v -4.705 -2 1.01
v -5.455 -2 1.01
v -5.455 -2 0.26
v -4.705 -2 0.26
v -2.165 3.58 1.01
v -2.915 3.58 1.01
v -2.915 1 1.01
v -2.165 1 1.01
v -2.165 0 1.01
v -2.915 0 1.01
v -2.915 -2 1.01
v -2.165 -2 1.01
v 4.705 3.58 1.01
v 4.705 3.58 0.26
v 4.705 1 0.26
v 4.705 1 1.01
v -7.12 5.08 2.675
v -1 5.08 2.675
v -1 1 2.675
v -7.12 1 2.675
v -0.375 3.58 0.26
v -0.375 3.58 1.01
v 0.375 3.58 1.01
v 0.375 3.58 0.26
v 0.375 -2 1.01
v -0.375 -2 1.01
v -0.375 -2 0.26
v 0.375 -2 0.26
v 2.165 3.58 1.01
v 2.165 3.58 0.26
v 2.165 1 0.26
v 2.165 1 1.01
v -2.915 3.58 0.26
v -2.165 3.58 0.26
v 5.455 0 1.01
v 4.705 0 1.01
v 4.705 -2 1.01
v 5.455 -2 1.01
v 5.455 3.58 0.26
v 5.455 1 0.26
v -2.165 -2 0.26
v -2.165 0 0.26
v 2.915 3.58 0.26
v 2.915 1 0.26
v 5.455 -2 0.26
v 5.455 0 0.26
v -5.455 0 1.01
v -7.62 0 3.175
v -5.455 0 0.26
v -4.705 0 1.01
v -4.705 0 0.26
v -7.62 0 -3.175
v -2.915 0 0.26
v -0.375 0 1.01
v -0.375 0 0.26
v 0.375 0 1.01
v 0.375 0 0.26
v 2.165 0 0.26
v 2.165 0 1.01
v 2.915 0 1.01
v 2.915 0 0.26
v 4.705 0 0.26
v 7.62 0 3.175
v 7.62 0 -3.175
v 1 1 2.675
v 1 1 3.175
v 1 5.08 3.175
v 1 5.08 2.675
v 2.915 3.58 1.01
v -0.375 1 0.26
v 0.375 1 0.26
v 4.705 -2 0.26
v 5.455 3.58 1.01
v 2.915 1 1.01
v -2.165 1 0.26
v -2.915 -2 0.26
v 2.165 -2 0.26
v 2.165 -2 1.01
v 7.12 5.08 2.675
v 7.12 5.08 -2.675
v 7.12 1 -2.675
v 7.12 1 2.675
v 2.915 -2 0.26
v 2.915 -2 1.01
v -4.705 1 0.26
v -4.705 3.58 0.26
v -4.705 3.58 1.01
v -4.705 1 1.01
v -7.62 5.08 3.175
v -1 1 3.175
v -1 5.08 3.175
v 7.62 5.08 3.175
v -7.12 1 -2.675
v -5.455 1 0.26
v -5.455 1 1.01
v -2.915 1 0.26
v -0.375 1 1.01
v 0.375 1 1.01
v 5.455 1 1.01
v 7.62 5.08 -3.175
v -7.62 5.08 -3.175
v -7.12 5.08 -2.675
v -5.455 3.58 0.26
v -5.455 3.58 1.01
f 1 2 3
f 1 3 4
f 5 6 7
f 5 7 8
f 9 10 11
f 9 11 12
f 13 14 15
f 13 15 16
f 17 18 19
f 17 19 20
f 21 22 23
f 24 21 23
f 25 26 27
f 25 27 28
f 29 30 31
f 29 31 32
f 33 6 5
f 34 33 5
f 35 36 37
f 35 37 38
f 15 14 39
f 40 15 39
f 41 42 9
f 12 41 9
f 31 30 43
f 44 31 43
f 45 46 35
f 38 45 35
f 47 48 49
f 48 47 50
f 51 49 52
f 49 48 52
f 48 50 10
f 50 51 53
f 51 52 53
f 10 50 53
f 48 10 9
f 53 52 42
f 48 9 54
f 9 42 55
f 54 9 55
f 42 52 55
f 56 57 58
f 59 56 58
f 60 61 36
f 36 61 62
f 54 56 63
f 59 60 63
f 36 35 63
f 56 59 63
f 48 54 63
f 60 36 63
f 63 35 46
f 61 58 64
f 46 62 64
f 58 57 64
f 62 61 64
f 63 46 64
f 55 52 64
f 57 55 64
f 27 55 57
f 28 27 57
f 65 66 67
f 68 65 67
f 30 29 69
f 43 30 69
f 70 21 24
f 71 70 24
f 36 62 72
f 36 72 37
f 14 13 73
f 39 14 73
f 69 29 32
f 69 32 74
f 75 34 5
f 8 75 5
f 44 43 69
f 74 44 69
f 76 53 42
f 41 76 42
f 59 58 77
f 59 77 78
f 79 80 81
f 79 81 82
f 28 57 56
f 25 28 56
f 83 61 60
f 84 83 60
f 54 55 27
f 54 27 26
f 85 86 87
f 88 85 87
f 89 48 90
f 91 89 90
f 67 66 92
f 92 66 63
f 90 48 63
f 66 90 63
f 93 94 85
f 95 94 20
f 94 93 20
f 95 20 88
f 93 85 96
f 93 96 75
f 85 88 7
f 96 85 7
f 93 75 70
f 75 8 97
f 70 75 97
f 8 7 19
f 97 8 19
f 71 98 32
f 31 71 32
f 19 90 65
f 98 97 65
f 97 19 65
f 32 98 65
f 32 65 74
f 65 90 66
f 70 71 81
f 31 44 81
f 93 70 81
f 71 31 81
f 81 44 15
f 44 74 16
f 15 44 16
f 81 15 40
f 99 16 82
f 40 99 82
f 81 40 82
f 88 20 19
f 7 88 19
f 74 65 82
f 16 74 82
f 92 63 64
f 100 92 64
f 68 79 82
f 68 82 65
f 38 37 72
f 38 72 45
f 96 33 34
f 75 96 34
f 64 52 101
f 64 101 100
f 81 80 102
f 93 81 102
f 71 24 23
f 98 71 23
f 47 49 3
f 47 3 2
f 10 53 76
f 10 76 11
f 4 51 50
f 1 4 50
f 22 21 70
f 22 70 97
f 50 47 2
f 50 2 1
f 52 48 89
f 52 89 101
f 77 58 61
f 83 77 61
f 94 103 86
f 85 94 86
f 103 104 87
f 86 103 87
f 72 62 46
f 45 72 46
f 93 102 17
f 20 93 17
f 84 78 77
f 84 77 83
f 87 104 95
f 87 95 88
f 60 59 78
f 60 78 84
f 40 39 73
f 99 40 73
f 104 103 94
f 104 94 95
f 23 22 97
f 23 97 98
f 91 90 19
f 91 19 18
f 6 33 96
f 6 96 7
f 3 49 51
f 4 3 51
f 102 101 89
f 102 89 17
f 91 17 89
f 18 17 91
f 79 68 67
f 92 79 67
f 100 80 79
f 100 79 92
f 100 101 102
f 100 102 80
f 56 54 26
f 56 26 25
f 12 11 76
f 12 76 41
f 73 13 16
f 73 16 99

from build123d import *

# Parameters (mm, degrees)
SKETCH_1_W           = 15.24
SKETCH_1_H           = 6.35
EXTRUDE_1_DEPTH      = 5.08
SKETCH_2_W           = 14.24
SKETCH_2_H           = 5.35
CUT_EXTRUDE_1_DEPTH  = 4.08
SKETCH_3_W           = 2
SKETCH_3_H           = 4.08
CUT_EXTRUDE_2_DEPTH  = 1
EXTRUDE_2_DEPTH      = 2
EXTRUDE_2_DEPTH_BACK = 3.58
SKETCH_4_W           = 0.75
SKETCH_4_H           = 0.75


with BuildPart() as part:
    # 草图1 → 拉伸1 (new body)
    with BuildSketch(Plane(origin=(0, 0, 0), x_dir=(1, 0, 0), z_dir=(0, 1, 0))):
        Rectangle(SKETCH_1_W, SKETCH_1_H)
    extrude(amount=EXTRUDE_1_DEPTH)

    # 草图2 → 切除-拉伸1 (cut)
    with BuildSketch(Plane(origin=(0, 5.08, 0), x_dir=(-1, 0, 0), z_dir=(0, 1, 0))):
        Rectangle(SKETCH_2_W, SKETCH_2_H)
    extrude(amount=-CUT_EXTRUDE_1_DEPTH, mode=Mode.SUBTRACT)

    # 草图3 → 切除-拉伸2 (cut)
    with BuildSketch(Plane.XY.offset(3.175)):
        with Locations((0, 3.04)):
            Rectangle(SKETCH_3_W, SKETCH_3_H)
    extrude(amount=-CUT_EXTRUDE_2_DEPTH, mode=Mode.SUBTRACT)

    # 草图4 → 拉伸2 (add, two sides: drawn at the far end of the back side and taken through both)
    with BuildSketch(Plane.XZ.offset(-EXTRUDE_2_DEPTH_BACK)):
        with Locations((-2.54, 0.635)):
            Rectangle(SKETCH_4_W, SKETCH_4_H)
        with Locations((0, 0.635)):
            Rectangle(SKETCH_4_W, SKETCH_4_H)
        with Locations((2.54, 0.635)):
            Rectangle(SKETCH_4_W, SKETCH_4_H)
        with Locations((-5.08, 0.635)):
            Rectangle(SKETCH_4_W, SKETCH_4_H)
        with Locations((5.08, 0.635)):
            Rectangle(SKETCH_4_W, SKETCH_4_H)
    extrude(amount=EXTRUDE_2_DEPTH + EXTRUDE_2_DEPTH_BACK)


solid = part.part
